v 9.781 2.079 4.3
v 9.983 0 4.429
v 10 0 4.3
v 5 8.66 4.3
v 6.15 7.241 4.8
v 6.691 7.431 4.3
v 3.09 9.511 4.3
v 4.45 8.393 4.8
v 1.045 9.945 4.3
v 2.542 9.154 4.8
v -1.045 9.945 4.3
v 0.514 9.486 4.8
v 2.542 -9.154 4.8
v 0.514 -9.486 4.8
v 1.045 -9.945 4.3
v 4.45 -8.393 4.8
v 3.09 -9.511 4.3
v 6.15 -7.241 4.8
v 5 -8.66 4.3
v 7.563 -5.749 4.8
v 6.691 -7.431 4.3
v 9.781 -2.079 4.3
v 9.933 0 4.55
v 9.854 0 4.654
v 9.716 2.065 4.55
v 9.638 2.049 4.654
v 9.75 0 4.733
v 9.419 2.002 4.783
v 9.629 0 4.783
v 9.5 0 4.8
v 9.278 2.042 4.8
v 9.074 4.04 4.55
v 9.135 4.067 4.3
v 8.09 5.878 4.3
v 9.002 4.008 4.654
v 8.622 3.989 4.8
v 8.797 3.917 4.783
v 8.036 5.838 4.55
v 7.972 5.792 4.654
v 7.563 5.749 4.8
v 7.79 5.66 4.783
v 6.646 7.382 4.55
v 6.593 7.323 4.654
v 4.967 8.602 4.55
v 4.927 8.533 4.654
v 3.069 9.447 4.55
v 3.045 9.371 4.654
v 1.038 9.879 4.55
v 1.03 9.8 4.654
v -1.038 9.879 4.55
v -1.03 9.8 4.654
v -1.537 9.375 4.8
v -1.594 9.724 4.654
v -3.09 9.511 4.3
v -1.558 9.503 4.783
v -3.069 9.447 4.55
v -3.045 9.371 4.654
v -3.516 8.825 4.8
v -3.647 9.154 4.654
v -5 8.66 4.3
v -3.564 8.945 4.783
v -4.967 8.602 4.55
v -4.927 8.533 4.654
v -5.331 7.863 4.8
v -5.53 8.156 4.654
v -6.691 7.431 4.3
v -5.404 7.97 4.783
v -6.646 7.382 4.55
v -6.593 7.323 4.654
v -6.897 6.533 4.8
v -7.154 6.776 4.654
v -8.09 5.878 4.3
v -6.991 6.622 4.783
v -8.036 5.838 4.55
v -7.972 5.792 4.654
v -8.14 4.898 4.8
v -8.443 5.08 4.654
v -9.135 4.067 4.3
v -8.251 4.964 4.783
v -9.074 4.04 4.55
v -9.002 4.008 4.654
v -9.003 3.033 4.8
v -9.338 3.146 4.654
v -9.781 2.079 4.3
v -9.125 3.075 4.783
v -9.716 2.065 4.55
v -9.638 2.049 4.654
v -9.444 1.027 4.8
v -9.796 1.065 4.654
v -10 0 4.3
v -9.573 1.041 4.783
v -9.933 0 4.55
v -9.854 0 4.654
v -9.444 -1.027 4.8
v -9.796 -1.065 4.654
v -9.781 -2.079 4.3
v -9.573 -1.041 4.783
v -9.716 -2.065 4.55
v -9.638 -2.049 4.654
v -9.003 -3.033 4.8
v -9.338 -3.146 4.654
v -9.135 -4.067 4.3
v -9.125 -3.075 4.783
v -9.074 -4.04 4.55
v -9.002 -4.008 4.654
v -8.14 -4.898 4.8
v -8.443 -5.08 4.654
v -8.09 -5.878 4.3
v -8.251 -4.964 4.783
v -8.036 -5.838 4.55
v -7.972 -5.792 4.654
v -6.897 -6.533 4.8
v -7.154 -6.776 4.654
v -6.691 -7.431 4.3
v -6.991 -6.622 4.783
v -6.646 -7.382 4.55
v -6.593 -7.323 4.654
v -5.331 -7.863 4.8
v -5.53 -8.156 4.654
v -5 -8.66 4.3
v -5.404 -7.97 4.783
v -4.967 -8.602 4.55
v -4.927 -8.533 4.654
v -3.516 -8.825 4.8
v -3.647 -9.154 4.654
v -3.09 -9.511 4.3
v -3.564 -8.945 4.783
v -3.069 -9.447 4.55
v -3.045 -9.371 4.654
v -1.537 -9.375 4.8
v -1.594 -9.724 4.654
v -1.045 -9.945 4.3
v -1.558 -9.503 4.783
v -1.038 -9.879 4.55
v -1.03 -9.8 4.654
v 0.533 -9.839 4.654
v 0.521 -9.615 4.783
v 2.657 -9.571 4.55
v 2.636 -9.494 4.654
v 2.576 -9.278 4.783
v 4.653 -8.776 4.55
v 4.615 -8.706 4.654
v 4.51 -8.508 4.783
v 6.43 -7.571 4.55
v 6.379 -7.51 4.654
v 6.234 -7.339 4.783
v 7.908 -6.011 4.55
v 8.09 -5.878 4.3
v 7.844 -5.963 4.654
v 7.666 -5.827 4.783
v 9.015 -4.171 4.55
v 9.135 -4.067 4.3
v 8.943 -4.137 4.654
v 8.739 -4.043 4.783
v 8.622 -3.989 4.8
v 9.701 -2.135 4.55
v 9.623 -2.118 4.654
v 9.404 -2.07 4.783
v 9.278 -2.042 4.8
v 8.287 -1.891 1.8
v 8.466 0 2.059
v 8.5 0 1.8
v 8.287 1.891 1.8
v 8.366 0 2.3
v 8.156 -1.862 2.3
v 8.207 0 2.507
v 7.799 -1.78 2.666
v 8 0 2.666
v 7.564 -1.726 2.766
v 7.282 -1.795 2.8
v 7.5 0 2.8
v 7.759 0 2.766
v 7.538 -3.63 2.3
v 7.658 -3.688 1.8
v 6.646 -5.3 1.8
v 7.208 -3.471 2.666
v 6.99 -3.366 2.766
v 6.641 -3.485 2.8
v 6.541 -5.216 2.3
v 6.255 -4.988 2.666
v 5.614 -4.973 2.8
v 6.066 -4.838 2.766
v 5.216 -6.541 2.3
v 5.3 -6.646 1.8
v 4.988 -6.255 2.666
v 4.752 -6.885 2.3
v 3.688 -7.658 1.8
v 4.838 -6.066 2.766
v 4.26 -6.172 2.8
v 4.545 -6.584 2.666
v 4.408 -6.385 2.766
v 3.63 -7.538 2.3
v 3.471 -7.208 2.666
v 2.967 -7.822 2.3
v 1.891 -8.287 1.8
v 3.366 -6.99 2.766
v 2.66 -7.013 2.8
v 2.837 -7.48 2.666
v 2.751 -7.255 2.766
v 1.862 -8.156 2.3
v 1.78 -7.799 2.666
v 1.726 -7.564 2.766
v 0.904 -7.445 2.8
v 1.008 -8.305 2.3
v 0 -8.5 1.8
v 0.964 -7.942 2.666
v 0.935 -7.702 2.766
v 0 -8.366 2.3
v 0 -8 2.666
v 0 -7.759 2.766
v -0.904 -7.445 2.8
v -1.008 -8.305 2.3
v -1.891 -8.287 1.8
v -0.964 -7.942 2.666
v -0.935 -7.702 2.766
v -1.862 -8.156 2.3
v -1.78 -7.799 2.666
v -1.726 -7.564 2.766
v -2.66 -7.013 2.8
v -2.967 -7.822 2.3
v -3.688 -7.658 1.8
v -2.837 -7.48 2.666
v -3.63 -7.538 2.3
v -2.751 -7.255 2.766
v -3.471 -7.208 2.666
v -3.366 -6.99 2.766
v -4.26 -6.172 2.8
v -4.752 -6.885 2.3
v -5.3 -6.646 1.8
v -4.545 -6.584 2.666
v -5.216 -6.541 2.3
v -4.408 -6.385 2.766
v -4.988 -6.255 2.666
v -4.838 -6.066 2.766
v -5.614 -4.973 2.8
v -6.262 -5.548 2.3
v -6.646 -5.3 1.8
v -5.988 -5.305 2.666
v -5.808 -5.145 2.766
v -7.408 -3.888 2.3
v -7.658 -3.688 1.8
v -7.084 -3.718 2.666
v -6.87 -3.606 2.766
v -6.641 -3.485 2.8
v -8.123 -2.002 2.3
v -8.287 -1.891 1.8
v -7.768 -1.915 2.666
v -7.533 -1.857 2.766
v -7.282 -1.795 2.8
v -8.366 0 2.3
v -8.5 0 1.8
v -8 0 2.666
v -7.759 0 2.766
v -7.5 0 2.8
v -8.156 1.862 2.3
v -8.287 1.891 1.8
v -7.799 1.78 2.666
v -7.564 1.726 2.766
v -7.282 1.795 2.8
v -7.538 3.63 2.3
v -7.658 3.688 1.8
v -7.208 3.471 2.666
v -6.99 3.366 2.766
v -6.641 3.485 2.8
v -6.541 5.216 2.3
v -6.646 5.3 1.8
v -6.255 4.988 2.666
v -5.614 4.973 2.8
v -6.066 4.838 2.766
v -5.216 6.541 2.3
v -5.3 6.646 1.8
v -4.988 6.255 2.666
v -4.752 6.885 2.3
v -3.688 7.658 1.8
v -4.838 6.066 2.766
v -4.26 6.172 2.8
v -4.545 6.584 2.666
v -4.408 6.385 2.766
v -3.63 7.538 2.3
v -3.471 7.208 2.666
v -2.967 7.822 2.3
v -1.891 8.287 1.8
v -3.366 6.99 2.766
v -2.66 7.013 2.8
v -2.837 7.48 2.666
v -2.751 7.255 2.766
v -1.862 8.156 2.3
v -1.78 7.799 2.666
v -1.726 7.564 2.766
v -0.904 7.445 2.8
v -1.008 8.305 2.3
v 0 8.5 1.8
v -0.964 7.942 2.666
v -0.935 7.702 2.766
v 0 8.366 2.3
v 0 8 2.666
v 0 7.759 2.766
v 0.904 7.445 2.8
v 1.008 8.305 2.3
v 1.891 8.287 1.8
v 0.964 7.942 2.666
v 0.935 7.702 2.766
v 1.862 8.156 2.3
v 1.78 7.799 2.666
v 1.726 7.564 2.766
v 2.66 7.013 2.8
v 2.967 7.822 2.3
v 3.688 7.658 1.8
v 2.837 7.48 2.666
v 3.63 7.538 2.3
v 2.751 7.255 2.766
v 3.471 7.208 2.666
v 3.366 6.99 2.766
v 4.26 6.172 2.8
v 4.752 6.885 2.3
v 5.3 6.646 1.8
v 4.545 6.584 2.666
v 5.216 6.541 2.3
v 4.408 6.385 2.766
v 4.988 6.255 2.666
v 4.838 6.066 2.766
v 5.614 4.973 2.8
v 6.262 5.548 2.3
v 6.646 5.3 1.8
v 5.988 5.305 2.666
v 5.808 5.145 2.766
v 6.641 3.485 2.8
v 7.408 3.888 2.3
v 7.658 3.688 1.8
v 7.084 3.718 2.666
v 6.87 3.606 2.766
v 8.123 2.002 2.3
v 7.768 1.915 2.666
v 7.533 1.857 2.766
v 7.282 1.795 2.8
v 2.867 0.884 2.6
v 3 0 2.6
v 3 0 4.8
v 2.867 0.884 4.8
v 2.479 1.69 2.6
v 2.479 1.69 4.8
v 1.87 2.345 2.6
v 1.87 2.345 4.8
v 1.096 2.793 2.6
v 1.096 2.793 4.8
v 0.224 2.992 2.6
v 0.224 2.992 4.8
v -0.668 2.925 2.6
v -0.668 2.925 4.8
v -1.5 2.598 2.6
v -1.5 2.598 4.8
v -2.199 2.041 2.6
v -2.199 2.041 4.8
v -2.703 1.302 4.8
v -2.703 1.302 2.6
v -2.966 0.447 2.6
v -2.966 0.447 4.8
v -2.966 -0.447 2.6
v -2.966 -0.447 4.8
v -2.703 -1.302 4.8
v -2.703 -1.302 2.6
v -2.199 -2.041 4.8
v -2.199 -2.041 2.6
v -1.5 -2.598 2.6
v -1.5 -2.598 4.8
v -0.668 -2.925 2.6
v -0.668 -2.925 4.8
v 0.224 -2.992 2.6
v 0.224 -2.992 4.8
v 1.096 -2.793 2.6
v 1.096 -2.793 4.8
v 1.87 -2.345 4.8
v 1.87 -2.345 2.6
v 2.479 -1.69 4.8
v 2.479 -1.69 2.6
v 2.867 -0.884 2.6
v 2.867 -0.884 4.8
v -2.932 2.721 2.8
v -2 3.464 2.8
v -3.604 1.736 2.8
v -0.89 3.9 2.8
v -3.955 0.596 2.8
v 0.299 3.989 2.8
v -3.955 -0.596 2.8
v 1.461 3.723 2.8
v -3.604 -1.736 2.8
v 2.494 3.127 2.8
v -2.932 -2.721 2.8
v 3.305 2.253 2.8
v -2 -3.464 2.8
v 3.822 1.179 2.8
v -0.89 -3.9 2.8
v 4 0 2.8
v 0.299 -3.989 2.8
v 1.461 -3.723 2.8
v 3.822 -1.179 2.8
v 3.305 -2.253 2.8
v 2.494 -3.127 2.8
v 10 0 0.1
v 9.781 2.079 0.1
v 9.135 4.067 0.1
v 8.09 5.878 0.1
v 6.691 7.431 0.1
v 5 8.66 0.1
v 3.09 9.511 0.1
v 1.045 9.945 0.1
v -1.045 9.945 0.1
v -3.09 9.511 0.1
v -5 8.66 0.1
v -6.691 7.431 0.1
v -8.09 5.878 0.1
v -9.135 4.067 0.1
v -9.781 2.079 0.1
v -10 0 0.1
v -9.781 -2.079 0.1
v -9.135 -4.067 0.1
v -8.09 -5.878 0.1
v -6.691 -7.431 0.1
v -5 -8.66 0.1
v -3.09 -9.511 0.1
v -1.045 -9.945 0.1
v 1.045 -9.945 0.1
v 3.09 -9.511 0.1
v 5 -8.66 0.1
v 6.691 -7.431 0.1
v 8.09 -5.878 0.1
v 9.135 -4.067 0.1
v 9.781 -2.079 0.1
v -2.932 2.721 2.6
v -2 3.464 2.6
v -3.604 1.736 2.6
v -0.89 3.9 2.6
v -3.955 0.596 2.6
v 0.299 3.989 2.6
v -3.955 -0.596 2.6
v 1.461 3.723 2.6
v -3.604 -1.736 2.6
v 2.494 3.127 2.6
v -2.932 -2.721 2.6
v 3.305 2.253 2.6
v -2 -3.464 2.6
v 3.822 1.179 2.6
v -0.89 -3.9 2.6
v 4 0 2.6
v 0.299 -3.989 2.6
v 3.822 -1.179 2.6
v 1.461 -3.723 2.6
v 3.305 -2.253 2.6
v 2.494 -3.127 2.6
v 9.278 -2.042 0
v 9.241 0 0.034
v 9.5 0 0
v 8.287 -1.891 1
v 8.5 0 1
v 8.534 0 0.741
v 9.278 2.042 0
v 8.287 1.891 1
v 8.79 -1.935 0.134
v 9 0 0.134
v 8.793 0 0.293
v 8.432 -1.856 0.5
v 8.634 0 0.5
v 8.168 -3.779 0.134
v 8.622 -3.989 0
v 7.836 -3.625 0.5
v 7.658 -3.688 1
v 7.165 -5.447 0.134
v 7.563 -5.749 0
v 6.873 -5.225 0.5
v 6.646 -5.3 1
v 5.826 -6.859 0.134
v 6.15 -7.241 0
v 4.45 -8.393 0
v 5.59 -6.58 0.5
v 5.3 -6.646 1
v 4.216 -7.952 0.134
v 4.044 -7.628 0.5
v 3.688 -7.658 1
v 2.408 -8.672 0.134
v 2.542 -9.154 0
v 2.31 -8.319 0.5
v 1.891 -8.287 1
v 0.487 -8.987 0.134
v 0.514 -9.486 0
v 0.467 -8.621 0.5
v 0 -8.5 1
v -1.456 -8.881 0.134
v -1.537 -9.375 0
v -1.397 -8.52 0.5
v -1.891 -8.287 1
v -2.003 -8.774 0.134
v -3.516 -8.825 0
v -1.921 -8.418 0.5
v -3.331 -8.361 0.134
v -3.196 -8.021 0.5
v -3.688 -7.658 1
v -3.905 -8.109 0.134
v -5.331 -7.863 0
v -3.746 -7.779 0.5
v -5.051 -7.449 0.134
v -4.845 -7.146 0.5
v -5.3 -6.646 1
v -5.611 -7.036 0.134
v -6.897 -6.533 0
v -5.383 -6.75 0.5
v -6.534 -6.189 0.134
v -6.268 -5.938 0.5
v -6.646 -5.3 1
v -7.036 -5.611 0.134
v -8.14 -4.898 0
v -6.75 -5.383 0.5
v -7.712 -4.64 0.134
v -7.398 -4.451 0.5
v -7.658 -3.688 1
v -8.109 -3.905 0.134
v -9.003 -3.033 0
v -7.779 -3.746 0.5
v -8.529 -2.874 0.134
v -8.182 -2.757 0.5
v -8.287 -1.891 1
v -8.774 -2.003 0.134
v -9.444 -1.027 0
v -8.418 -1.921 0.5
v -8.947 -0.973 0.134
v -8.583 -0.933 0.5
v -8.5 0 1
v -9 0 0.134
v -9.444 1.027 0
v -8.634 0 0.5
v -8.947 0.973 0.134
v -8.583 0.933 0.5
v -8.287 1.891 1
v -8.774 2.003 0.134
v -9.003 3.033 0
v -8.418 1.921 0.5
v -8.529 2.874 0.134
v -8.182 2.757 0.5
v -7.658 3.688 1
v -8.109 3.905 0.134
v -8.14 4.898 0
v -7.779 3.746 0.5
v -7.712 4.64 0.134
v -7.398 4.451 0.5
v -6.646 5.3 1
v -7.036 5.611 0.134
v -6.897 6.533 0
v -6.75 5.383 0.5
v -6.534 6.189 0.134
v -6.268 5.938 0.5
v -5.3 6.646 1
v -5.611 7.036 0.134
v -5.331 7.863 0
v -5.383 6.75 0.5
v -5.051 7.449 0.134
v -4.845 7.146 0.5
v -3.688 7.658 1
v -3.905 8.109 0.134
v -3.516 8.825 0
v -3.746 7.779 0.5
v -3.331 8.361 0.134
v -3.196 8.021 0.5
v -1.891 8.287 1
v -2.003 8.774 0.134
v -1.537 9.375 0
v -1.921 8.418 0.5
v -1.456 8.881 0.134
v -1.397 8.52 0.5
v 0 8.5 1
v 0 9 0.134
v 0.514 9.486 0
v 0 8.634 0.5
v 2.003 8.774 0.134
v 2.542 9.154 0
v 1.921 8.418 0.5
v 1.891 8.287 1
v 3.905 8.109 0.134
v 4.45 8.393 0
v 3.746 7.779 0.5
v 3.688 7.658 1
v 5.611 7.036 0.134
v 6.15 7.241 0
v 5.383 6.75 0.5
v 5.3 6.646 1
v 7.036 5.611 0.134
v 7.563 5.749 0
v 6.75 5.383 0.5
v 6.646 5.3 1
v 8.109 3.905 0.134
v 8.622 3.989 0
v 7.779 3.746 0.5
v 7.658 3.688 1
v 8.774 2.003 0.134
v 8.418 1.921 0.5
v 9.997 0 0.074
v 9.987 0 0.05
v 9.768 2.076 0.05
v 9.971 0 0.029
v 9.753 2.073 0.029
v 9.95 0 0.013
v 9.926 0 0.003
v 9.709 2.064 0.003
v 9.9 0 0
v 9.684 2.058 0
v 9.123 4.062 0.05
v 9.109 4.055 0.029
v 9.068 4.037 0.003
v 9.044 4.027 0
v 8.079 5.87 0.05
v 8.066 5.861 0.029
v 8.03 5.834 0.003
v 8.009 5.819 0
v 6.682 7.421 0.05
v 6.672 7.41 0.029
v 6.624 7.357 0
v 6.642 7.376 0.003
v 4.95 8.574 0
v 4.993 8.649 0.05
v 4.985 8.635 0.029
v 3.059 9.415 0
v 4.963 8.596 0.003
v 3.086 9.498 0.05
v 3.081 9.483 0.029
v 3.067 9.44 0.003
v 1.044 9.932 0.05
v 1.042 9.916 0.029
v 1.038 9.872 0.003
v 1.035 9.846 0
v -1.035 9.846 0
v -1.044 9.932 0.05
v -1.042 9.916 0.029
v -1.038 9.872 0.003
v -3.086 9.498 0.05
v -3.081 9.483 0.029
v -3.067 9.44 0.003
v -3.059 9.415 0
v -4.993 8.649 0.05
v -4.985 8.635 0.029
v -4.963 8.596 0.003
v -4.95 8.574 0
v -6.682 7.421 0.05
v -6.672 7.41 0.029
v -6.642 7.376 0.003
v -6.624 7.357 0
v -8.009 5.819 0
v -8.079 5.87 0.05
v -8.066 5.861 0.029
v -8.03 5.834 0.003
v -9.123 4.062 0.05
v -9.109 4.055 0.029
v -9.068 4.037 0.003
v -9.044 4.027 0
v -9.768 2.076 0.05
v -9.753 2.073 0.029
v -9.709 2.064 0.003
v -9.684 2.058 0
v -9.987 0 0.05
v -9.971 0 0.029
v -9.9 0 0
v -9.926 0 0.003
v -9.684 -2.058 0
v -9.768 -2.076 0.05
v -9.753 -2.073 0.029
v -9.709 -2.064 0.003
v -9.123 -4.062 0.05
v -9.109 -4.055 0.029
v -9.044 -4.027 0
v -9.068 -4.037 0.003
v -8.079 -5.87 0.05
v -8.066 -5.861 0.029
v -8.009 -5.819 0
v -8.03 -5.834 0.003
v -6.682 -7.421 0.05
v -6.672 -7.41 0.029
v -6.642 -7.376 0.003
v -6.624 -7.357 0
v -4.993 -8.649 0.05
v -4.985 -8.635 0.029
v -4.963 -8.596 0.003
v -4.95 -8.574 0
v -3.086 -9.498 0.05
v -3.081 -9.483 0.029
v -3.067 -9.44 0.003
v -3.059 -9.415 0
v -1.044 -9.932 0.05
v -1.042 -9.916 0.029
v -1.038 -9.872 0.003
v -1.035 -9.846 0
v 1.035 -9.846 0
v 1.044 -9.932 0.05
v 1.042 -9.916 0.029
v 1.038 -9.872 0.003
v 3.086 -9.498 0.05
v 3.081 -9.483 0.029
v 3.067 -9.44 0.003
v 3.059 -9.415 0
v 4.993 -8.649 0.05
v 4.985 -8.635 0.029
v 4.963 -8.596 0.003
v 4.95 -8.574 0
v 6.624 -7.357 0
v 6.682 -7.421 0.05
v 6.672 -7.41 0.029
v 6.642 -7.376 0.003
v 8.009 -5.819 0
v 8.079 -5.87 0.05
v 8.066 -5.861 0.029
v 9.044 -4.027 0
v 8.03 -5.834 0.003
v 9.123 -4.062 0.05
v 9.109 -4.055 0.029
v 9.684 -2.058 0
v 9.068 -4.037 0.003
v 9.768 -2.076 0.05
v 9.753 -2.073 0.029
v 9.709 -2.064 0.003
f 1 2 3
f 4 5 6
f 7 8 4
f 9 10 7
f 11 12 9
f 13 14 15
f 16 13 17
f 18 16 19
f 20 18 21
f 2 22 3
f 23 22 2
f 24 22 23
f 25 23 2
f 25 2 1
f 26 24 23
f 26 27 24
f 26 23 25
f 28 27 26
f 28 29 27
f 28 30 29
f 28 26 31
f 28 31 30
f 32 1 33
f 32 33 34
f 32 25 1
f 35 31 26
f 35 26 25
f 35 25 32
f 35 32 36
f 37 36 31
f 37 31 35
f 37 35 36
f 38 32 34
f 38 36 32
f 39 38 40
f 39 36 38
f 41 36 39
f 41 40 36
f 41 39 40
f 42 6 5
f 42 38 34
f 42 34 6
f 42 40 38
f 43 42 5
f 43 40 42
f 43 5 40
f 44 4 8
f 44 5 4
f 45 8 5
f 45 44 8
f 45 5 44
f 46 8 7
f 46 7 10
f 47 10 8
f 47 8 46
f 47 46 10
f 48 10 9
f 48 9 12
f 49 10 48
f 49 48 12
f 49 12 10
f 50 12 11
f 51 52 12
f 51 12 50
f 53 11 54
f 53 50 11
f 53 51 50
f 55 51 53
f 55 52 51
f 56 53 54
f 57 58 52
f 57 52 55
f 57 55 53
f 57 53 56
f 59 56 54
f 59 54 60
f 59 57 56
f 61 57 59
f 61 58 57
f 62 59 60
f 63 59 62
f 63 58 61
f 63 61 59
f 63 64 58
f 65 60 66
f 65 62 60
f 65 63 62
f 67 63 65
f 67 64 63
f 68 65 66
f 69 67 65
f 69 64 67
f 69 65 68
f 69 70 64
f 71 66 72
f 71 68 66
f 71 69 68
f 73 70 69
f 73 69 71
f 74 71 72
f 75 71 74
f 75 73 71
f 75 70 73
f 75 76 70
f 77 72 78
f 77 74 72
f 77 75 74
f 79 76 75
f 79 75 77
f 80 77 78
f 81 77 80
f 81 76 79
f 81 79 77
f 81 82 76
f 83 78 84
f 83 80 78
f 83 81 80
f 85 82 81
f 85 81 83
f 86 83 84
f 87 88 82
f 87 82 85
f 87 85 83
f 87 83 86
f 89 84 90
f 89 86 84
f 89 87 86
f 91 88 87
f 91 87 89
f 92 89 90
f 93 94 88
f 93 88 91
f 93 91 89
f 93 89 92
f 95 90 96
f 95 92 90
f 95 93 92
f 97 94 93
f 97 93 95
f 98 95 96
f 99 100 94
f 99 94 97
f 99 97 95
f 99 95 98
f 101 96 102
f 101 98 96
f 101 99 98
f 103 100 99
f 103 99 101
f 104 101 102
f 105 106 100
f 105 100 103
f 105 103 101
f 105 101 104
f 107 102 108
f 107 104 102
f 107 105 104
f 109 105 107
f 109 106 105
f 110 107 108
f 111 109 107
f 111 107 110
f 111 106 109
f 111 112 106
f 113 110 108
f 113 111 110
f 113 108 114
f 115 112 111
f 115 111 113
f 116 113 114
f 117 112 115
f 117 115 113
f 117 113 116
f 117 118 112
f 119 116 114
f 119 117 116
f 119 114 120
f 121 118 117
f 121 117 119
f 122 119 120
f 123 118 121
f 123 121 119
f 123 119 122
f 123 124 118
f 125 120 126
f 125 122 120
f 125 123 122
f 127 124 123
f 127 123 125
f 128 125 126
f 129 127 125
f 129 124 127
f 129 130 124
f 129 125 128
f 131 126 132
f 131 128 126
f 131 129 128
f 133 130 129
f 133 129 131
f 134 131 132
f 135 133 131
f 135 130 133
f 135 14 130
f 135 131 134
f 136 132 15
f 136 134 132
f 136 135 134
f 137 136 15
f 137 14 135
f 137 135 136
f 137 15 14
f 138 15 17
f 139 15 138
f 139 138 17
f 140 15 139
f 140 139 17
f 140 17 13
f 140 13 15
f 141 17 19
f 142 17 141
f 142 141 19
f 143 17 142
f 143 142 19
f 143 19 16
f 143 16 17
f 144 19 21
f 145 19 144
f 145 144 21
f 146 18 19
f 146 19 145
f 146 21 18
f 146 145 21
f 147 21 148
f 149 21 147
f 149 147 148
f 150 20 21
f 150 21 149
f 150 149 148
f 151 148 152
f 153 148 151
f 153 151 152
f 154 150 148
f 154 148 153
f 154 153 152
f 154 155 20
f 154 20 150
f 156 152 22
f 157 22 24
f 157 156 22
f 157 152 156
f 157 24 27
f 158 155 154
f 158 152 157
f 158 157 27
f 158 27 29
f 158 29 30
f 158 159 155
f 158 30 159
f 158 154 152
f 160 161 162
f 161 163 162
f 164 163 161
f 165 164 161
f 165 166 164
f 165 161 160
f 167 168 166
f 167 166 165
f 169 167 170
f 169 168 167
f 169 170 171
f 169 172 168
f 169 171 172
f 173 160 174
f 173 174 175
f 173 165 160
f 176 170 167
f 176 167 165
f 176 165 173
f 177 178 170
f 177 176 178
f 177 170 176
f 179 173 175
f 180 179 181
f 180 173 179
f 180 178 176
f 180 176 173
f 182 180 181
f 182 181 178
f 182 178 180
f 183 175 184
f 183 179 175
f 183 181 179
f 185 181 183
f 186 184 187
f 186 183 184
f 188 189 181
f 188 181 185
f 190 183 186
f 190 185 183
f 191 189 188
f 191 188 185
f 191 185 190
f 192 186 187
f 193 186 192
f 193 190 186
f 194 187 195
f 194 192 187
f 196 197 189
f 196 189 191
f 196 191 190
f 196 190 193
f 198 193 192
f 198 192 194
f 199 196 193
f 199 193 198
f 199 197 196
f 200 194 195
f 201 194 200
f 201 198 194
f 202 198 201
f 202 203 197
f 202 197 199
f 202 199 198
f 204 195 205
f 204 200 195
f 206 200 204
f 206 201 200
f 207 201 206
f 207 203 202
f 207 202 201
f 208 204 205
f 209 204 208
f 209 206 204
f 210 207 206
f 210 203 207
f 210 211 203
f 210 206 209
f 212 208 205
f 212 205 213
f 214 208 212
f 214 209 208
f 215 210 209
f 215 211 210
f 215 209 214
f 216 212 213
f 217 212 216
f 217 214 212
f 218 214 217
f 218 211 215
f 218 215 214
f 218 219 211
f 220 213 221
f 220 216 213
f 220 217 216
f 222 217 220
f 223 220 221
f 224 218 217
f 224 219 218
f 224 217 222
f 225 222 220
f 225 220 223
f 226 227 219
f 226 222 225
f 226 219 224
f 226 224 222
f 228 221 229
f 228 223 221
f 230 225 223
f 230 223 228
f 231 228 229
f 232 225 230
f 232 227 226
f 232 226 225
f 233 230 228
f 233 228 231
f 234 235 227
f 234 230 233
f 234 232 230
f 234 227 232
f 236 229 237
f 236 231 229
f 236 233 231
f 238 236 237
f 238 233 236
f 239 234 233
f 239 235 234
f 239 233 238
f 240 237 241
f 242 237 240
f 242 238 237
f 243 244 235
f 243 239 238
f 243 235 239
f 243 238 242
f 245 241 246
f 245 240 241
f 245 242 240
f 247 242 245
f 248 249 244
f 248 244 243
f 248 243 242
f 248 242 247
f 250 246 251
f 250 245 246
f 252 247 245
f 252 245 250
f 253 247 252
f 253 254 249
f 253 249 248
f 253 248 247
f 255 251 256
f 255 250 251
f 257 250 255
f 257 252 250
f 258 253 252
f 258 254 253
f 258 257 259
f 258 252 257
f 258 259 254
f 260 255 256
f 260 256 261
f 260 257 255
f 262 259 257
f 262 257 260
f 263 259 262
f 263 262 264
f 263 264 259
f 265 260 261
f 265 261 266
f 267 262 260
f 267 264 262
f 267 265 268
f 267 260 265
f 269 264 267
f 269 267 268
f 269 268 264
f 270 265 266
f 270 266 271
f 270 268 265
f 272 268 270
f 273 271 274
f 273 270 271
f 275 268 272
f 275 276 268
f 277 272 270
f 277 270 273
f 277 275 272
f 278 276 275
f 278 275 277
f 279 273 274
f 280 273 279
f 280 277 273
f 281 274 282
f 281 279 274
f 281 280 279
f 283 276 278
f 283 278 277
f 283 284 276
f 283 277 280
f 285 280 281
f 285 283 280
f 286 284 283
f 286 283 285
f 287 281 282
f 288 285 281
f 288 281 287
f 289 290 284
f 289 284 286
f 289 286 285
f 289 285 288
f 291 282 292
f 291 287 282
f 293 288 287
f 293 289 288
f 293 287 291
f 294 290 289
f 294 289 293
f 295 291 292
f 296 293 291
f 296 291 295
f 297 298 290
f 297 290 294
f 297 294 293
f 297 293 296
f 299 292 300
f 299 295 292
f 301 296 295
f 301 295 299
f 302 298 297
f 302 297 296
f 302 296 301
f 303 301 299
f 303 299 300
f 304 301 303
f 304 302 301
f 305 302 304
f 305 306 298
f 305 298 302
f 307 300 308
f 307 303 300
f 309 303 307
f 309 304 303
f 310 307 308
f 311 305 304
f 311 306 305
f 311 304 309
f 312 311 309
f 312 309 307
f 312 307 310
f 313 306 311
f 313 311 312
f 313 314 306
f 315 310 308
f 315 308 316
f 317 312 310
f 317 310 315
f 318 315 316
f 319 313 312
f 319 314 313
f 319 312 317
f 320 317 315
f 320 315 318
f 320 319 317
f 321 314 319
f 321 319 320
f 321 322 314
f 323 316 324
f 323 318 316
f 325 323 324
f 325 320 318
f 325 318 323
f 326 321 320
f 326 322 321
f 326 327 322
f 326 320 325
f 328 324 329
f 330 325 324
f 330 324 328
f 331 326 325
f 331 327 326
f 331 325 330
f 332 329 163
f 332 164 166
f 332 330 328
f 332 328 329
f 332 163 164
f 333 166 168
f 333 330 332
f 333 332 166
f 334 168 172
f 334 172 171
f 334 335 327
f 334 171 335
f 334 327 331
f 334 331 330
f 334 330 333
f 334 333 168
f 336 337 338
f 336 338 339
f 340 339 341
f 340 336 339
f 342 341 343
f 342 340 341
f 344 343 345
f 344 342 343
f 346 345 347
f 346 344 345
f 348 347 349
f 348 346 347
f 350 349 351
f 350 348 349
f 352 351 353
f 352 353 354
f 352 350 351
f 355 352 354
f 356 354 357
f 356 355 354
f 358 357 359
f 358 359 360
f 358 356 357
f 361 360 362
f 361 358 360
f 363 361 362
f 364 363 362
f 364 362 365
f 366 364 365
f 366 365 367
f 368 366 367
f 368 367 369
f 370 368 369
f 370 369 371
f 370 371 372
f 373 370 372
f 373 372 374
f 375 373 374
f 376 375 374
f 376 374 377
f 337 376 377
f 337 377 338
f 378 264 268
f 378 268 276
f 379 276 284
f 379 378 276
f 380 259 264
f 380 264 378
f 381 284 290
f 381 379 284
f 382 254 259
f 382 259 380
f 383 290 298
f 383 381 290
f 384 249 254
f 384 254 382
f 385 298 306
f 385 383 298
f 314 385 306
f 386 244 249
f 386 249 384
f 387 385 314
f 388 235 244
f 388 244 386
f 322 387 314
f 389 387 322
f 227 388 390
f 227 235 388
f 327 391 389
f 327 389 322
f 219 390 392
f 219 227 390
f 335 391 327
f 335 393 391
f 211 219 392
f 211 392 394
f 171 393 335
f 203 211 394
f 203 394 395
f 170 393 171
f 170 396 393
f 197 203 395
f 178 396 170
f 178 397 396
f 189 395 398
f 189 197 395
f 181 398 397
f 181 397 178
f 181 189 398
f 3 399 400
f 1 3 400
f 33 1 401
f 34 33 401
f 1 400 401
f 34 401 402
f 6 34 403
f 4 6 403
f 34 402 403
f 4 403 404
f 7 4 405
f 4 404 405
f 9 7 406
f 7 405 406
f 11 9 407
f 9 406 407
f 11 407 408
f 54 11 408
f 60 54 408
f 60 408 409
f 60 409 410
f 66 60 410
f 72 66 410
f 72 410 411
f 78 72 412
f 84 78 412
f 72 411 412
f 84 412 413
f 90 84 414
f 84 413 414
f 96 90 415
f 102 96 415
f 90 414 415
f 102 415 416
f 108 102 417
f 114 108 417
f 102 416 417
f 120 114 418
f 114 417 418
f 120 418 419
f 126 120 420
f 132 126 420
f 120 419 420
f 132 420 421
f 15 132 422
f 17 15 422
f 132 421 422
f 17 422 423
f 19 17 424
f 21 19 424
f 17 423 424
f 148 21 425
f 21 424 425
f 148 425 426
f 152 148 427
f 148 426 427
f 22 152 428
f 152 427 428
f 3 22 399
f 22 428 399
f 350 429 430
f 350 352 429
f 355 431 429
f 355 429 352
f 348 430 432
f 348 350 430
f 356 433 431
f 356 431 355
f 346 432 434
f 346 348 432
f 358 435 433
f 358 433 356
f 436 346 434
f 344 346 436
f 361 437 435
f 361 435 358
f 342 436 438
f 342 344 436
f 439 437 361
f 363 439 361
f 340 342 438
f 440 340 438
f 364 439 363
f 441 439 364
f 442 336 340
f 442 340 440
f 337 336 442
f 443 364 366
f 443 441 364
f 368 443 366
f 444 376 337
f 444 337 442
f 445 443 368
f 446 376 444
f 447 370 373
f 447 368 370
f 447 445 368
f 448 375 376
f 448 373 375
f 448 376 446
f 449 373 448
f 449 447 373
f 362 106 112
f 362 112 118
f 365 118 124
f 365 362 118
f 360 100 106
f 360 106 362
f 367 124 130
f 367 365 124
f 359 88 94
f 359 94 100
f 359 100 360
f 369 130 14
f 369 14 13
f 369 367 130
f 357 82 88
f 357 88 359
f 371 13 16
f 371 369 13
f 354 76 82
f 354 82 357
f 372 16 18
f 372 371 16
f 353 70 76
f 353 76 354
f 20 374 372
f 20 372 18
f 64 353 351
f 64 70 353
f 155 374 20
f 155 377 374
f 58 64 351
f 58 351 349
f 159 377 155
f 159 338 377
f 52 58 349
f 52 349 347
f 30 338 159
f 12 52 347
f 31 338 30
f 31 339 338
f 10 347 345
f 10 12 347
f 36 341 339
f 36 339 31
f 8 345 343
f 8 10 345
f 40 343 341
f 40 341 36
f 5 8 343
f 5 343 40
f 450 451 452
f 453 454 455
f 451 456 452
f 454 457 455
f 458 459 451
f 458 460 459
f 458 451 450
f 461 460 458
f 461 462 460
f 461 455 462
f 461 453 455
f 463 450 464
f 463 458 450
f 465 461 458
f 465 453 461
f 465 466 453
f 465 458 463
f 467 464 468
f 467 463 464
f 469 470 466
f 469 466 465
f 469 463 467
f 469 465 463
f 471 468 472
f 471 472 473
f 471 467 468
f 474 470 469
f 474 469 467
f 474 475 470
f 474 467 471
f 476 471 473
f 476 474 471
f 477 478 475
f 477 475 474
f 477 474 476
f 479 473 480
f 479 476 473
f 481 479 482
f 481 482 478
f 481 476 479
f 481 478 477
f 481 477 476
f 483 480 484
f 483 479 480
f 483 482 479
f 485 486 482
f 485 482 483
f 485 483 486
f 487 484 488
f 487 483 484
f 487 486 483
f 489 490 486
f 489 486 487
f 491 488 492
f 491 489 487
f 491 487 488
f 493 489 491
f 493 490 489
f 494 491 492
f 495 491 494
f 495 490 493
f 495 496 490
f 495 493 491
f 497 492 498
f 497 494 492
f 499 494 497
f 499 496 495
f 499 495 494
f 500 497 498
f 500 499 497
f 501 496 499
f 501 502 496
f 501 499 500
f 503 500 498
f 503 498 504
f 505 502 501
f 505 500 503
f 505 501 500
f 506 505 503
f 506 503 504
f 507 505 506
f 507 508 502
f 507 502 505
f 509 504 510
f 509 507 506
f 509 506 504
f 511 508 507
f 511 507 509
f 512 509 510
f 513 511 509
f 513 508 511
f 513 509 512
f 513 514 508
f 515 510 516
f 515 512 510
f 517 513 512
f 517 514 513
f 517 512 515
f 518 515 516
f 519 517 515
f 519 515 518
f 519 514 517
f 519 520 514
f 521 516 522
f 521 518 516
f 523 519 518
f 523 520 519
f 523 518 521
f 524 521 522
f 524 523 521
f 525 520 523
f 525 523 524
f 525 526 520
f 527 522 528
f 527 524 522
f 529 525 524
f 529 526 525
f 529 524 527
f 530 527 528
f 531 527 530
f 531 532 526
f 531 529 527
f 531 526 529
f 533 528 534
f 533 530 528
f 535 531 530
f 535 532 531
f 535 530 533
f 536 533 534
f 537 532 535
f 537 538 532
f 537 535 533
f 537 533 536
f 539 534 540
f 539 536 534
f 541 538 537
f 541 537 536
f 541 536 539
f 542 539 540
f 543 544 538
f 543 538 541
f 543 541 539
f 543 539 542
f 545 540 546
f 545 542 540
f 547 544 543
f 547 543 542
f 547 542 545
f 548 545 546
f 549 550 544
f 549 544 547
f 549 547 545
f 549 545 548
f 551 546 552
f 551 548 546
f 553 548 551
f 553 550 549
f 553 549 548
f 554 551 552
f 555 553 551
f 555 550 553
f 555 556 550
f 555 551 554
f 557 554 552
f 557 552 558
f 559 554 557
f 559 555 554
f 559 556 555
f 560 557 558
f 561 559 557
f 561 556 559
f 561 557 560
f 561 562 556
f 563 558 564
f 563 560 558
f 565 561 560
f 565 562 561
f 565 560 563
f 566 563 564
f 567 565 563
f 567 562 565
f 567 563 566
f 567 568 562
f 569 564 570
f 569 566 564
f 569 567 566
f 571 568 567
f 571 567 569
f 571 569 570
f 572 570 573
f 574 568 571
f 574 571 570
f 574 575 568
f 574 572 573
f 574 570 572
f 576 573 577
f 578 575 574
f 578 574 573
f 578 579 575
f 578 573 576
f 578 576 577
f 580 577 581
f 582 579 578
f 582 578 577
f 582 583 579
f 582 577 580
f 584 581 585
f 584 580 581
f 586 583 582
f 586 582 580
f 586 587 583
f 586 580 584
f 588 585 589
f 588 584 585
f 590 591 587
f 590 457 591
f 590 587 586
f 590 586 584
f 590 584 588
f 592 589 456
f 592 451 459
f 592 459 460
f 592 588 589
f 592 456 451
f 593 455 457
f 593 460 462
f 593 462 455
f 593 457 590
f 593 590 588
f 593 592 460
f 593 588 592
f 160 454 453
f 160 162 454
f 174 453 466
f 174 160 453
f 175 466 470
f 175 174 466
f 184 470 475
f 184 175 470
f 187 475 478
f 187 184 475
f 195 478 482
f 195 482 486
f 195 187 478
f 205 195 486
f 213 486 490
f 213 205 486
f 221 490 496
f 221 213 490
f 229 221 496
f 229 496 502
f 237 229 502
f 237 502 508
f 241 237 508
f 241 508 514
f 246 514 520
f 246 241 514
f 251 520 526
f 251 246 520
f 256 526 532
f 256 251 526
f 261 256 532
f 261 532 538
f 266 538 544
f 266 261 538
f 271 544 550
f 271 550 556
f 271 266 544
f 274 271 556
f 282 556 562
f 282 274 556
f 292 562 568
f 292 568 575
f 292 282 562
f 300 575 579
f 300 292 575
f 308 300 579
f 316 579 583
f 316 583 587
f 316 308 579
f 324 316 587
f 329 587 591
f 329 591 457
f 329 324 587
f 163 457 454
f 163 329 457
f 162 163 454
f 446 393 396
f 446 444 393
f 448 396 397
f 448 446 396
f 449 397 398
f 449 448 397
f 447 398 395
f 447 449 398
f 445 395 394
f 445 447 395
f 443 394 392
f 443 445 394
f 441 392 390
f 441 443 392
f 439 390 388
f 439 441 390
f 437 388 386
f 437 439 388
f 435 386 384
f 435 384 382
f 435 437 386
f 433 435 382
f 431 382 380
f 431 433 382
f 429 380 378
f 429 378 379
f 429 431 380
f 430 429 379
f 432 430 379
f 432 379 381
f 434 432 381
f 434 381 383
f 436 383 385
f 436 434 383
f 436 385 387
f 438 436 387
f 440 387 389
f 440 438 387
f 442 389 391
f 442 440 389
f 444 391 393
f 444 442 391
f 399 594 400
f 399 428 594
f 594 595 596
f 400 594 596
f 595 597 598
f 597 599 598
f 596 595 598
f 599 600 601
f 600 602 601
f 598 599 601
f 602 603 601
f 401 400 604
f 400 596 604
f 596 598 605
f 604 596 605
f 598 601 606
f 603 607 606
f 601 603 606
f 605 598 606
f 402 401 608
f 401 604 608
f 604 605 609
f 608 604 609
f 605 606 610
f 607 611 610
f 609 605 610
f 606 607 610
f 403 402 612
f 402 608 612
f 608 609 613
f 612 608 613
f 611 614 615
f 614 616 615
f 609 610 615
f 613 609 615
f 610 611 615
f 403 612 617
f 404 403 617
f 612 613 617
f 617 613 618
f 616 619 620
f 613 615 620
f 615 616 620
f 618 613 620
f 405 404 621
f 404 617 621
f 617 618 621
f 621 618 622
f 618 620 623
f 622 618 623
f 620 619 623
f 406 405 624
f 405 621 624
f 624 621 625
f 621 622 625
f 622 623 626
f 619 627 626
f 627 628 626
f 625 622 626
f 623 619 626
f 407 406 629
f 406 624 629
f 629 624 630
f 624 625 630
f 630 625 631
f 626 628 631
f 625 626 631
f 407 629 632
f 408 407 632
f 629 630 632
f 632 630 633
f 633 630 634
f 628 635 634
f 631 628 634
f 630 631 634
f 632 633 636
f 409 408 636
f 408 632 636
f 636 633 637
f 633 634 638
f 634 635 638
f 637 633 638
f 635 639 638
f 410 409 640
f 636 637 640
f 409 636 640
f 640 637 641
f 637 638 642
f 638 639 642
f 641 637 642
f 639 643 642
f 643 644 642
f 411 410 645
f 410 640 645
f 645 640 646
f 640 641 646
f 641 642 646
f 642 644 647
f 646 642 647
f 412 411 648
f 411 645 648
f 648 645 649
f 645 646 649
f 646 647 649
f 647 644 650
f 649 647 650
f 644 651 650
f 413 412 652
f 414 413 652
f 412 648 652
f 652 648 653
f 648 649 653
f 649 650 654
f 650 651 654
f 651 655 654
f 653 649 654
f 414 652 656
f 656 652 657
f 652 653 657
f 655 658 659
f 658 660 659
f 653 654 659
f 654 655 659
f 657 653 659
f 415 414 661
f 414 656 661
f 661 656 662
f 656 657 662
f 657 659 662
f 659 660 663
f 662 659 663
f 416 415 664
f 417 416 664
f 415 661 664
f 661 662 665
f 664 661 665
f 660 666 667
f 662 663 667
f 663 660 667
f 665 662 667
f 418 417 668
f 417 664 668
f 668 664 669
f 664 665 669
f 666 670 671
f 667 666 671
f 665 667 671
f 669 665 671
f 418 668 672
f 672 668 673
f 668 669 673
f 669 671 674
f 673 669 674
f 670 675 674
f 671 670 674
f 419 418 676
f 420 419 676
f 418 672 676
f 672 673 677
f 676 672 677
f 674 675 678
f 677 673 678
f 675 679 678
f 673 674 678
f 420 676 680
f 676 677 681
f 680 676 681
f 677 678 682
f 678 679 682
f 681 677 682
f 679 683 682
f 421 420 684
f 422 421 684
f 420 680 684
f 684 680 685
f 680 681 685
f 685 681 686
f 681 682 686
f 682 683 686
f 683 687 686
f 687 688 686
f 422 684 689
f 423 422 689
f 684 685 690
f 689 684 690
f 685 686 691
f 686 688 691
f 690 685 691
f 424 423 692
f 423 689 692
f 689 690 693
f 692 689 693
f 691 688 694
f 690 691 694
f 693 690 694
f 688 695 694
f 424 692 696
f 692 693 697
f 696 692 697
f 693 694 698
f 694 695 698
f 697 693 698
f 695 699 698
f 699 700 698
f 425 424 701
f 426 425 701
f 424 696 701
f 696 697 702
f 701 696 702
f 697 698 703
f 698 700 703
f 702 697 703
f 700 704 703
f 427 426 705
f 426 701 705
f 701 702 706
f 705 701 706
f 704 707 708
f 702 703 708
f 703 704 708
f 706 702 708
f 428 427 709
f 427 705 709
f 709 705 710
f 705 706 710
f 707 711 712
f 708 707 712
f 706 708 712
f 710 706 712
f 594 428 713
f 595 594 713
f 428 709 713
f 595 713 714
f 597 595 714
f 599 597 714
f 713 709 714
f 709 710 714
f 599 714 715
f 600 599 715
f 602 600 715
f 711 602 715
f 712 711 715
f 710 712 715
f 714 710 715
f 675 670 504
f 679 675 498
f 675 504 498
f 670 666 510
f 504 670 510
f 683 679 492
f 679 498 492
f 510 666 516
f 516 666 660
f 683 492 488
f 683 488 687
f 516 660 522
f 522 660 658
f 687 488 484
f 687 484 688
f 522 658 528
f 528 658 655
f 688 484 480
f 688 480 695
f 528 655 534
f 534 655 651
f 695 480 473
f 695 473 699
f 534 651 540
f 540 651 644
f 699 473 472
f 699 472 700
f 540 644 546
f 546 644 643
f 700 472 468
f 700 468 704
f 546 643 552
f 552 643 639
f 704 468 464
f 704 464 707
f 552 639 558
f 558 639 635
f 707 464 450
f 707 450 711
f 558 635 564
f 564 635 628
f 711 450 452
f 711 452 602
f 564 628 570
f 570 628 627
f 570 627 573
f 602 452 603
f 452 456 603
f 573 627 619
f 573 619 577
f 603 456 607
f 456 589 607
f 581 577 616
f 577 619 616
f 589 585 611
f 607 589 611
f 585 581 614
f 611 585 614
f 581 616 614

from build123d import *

# Parameters (mm, degrees)
SKETCH1_R           = 10
SKETCH1_R_2         = 3
BOSS_EXTRUDE1_DEPTH = 4.8
FILLET1_R           = 0.5
FILLET2_R           = 0.1


with BuildPart() as part:
    # Sketch1 → Boss-Extrude1 (new body)
    with BuildSketch(Plane.XY):
        Circle(SKETCH1_R)
        Circle(SKETCH1_R_2, mode=Mode.SUBTRACT)
    extrude(amount=BOSS_EXTRUDE1_DEPTH)

    # Sketch2 → Cut-Revolve1 (revolve, cut)
    with BuildSketch(Plane(origin=(0, 0, 0), x_dir=(1, 0, 0), z_dir=(0, 1, 0)), mode=Mode.PRIVATE) as cut_revolve1_sk:
        with BuildLine():
            Line((-8.5, -1), (-8.5, -1.8))
            ThreePointArc((-8.5, -1.8), (-8.207106781, -2.507106781), (-7.5, -2.8))
            Line((-7.5, -2.8), (-4, -2.8))
            Line((-4, -2.8), (-4, -2.6))
            Line((-4, -2.6), (-3, -2.6))
            Line((-3, -2.6), (-3, 0))
            Line((-3, 0), (-8.5, 0))
            Line((-8.5, 0), (-9.5, 0))
            ThreePointArc((-9.5, 0), (-8.792893219, -0.292893219), (-8.5, -1))
        make_face()
    revolve(cut_revolve1_sk.sketch.rotate(Axis((0, 0, 0), (0, 0, -1)), 180), axis=Axis((0, 0, 0), (0, 0, -1)), mode=Mode.SUBTRACT)

    # Fillet1
    fillet1_edges = [part.edges().sort_by_distance(p)[0] for p in [
        (-10, 0, 4.8),
    ]]
    fillet(fillet1_edges, radius=FILLET1_R)

    # Fillet2
    fillet2_edges = [part.edges().sort_by_distance(p)[0] for p in [
        (-10, 0, 0),
    ]]
    fillet(fillet2_edges, radius=FILLET2_R)


solid = part.part
